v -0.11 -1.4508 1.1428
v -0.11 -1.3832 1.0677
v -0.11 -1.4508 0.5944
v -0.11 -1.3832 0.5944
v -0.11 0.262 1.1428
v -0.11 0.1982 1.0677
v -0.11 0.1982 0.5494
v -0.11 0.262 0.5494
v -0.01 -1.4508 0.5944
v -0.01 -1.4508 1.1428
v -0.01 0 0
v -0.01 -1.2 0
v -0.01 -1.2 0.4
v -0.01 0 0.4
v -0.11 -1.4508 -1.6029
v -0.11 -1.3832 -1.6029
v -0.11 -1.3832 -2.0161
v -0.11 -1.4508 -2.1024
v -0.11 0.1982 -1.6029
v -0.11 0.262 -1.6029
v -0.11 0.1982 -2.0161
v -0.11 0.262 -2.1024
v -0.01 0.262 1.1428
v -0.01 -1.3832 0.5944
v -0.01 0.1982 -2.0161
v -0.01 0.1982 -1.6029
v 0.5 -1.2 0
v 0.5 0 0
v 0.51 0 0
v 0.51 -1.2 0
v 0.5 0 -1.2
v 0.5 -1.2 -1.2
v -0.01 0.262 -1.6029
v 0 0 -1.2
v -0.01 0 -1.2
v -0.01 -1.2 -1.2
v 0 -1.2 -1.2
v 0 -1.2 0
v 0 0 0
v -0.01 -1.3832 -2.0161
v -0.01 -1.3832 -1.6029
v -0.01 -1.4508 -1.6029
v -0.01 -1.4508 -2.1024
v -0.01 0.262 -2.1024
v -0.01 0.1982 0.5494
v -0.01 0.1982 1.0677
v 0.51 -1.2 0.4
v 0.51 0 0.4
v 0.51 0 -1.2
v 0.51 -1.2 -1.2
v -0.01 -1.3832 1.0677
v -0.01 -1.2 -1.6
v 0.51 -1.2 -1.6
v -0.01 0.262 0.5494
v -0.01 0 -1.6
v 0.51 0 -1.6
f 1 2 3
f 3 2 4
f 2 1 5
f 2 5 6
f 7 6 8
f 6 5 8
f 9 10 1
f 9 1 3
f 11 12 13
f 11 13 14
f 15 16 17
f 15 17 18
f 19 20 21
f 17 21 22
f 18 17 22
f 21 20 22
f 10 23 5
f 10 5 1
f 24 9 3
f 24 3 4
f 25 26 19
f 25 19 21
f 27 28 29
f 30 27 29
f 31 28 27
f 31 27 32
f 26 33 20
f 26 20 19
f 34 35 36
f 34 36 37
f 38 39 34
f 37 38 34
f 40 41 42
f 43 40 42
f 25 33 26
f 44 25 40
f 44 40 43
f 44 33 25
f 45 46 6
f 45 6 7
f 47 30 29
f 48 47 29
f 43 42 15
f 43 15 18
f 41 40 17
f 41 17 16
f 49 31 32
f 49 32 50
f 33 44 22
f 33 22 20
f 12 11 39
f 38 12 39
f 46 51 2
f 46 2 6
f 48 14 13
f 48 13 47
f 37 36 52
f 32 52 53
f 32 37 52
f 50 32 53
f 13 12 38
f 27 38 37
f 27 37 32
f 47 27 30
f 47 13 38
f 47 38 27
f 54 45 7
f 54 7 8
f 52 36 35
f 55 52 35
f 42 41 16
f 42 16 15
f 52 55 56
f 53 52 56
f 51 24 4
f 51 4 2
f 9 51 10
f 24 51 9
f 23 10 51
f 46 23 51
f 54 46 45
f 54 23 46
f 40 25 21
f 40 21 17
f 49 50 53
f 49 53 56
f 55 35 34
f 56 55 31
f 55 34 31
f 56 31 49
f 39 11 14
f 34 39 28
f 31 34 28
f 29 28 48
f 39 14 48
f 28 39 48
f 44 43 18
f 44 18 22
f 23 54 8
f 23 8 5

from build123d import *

# Parameters (mm, degrees)
SKETCH_1_W        = 1.2
SKETCH_1_H        = 1.2
EXTRUDE_1_DEPTH   = 0.5
SKETCH_2_W        = 0.52
SKETCH_2_H        = 1.2
EXTRUDE_3_DEPTH   = 0.4
EXTRUDE_4_DEPTH   = 0.1
EXTRUDE_4_2_DEPTH = 0.1


with BuildPart() as part:
    # 草图1 → 凸台-拉伸1 (new body)
    with BuildSketch(Plane(origin=(0, 0, 0), x_dir=(0, 0, -1), z_dir=(1, 0, 0))):
        with Locations((0.6, -0.6)):
            Rectangle(SKETCH_1_W, SKETCH_1_H)
    extrude(amount=EXTRUDE_1_DEPTH)

    # 草图2 → 凸台-拉伸3 (add)
    with BuildSketch(Plane.XY):
        with Locations((0.25, -0.6)):
            Rectangle(SKETCH_2_W, SKETCH_2_H)
    extrude_3 = extrude(amount=EXTRUDE_3_DEPTH)

    # 镜向1: 凸台-拉伸3 across plane
    add(extrude_3.mirror(Plane.XY.offset(-0.6)))


with BuildPart() as body_2:
    # 草图3 → 凸台-拉伸4 (new body)
    with BuildSketch(Plane.ZY.offset(0.01)):
        Polygon((-1.602882837, 0.262028506), (-1.602882837, 0.198174543), (-2.016055542, 0.198174543), (-2.016055542, -1.383150081), (-1.602882837, -1.383150081), (-1.602882837, -1.45076016), (-2.102446198, -1.45076016), (-2.102446198, 0.262028506), align=None)
    extrude(amount=EXTRUDE_4_DEPTH)


with BuildPart() as body_3:
    # 草图3 → Extrude 4 2 (new body)
    with BuildSketch(Plane.ZY.offset(0.01)):
        Polygon((1.14283759, 0.262028506), (1.14283759, -1.45076016), (0.594444728, -1.45076016), (0.594444728, -1.383150081), (1.06771528, -1.383150081), (1.06771528, 0.198174543), (0.549371342, 0.198174543), (0.549371342, 0.262028506), align=None)
    extrude(amount=EXTRUDE_4_2_DEPTH)


solid = Compound([part.part, body_2.part, body_3.part])
